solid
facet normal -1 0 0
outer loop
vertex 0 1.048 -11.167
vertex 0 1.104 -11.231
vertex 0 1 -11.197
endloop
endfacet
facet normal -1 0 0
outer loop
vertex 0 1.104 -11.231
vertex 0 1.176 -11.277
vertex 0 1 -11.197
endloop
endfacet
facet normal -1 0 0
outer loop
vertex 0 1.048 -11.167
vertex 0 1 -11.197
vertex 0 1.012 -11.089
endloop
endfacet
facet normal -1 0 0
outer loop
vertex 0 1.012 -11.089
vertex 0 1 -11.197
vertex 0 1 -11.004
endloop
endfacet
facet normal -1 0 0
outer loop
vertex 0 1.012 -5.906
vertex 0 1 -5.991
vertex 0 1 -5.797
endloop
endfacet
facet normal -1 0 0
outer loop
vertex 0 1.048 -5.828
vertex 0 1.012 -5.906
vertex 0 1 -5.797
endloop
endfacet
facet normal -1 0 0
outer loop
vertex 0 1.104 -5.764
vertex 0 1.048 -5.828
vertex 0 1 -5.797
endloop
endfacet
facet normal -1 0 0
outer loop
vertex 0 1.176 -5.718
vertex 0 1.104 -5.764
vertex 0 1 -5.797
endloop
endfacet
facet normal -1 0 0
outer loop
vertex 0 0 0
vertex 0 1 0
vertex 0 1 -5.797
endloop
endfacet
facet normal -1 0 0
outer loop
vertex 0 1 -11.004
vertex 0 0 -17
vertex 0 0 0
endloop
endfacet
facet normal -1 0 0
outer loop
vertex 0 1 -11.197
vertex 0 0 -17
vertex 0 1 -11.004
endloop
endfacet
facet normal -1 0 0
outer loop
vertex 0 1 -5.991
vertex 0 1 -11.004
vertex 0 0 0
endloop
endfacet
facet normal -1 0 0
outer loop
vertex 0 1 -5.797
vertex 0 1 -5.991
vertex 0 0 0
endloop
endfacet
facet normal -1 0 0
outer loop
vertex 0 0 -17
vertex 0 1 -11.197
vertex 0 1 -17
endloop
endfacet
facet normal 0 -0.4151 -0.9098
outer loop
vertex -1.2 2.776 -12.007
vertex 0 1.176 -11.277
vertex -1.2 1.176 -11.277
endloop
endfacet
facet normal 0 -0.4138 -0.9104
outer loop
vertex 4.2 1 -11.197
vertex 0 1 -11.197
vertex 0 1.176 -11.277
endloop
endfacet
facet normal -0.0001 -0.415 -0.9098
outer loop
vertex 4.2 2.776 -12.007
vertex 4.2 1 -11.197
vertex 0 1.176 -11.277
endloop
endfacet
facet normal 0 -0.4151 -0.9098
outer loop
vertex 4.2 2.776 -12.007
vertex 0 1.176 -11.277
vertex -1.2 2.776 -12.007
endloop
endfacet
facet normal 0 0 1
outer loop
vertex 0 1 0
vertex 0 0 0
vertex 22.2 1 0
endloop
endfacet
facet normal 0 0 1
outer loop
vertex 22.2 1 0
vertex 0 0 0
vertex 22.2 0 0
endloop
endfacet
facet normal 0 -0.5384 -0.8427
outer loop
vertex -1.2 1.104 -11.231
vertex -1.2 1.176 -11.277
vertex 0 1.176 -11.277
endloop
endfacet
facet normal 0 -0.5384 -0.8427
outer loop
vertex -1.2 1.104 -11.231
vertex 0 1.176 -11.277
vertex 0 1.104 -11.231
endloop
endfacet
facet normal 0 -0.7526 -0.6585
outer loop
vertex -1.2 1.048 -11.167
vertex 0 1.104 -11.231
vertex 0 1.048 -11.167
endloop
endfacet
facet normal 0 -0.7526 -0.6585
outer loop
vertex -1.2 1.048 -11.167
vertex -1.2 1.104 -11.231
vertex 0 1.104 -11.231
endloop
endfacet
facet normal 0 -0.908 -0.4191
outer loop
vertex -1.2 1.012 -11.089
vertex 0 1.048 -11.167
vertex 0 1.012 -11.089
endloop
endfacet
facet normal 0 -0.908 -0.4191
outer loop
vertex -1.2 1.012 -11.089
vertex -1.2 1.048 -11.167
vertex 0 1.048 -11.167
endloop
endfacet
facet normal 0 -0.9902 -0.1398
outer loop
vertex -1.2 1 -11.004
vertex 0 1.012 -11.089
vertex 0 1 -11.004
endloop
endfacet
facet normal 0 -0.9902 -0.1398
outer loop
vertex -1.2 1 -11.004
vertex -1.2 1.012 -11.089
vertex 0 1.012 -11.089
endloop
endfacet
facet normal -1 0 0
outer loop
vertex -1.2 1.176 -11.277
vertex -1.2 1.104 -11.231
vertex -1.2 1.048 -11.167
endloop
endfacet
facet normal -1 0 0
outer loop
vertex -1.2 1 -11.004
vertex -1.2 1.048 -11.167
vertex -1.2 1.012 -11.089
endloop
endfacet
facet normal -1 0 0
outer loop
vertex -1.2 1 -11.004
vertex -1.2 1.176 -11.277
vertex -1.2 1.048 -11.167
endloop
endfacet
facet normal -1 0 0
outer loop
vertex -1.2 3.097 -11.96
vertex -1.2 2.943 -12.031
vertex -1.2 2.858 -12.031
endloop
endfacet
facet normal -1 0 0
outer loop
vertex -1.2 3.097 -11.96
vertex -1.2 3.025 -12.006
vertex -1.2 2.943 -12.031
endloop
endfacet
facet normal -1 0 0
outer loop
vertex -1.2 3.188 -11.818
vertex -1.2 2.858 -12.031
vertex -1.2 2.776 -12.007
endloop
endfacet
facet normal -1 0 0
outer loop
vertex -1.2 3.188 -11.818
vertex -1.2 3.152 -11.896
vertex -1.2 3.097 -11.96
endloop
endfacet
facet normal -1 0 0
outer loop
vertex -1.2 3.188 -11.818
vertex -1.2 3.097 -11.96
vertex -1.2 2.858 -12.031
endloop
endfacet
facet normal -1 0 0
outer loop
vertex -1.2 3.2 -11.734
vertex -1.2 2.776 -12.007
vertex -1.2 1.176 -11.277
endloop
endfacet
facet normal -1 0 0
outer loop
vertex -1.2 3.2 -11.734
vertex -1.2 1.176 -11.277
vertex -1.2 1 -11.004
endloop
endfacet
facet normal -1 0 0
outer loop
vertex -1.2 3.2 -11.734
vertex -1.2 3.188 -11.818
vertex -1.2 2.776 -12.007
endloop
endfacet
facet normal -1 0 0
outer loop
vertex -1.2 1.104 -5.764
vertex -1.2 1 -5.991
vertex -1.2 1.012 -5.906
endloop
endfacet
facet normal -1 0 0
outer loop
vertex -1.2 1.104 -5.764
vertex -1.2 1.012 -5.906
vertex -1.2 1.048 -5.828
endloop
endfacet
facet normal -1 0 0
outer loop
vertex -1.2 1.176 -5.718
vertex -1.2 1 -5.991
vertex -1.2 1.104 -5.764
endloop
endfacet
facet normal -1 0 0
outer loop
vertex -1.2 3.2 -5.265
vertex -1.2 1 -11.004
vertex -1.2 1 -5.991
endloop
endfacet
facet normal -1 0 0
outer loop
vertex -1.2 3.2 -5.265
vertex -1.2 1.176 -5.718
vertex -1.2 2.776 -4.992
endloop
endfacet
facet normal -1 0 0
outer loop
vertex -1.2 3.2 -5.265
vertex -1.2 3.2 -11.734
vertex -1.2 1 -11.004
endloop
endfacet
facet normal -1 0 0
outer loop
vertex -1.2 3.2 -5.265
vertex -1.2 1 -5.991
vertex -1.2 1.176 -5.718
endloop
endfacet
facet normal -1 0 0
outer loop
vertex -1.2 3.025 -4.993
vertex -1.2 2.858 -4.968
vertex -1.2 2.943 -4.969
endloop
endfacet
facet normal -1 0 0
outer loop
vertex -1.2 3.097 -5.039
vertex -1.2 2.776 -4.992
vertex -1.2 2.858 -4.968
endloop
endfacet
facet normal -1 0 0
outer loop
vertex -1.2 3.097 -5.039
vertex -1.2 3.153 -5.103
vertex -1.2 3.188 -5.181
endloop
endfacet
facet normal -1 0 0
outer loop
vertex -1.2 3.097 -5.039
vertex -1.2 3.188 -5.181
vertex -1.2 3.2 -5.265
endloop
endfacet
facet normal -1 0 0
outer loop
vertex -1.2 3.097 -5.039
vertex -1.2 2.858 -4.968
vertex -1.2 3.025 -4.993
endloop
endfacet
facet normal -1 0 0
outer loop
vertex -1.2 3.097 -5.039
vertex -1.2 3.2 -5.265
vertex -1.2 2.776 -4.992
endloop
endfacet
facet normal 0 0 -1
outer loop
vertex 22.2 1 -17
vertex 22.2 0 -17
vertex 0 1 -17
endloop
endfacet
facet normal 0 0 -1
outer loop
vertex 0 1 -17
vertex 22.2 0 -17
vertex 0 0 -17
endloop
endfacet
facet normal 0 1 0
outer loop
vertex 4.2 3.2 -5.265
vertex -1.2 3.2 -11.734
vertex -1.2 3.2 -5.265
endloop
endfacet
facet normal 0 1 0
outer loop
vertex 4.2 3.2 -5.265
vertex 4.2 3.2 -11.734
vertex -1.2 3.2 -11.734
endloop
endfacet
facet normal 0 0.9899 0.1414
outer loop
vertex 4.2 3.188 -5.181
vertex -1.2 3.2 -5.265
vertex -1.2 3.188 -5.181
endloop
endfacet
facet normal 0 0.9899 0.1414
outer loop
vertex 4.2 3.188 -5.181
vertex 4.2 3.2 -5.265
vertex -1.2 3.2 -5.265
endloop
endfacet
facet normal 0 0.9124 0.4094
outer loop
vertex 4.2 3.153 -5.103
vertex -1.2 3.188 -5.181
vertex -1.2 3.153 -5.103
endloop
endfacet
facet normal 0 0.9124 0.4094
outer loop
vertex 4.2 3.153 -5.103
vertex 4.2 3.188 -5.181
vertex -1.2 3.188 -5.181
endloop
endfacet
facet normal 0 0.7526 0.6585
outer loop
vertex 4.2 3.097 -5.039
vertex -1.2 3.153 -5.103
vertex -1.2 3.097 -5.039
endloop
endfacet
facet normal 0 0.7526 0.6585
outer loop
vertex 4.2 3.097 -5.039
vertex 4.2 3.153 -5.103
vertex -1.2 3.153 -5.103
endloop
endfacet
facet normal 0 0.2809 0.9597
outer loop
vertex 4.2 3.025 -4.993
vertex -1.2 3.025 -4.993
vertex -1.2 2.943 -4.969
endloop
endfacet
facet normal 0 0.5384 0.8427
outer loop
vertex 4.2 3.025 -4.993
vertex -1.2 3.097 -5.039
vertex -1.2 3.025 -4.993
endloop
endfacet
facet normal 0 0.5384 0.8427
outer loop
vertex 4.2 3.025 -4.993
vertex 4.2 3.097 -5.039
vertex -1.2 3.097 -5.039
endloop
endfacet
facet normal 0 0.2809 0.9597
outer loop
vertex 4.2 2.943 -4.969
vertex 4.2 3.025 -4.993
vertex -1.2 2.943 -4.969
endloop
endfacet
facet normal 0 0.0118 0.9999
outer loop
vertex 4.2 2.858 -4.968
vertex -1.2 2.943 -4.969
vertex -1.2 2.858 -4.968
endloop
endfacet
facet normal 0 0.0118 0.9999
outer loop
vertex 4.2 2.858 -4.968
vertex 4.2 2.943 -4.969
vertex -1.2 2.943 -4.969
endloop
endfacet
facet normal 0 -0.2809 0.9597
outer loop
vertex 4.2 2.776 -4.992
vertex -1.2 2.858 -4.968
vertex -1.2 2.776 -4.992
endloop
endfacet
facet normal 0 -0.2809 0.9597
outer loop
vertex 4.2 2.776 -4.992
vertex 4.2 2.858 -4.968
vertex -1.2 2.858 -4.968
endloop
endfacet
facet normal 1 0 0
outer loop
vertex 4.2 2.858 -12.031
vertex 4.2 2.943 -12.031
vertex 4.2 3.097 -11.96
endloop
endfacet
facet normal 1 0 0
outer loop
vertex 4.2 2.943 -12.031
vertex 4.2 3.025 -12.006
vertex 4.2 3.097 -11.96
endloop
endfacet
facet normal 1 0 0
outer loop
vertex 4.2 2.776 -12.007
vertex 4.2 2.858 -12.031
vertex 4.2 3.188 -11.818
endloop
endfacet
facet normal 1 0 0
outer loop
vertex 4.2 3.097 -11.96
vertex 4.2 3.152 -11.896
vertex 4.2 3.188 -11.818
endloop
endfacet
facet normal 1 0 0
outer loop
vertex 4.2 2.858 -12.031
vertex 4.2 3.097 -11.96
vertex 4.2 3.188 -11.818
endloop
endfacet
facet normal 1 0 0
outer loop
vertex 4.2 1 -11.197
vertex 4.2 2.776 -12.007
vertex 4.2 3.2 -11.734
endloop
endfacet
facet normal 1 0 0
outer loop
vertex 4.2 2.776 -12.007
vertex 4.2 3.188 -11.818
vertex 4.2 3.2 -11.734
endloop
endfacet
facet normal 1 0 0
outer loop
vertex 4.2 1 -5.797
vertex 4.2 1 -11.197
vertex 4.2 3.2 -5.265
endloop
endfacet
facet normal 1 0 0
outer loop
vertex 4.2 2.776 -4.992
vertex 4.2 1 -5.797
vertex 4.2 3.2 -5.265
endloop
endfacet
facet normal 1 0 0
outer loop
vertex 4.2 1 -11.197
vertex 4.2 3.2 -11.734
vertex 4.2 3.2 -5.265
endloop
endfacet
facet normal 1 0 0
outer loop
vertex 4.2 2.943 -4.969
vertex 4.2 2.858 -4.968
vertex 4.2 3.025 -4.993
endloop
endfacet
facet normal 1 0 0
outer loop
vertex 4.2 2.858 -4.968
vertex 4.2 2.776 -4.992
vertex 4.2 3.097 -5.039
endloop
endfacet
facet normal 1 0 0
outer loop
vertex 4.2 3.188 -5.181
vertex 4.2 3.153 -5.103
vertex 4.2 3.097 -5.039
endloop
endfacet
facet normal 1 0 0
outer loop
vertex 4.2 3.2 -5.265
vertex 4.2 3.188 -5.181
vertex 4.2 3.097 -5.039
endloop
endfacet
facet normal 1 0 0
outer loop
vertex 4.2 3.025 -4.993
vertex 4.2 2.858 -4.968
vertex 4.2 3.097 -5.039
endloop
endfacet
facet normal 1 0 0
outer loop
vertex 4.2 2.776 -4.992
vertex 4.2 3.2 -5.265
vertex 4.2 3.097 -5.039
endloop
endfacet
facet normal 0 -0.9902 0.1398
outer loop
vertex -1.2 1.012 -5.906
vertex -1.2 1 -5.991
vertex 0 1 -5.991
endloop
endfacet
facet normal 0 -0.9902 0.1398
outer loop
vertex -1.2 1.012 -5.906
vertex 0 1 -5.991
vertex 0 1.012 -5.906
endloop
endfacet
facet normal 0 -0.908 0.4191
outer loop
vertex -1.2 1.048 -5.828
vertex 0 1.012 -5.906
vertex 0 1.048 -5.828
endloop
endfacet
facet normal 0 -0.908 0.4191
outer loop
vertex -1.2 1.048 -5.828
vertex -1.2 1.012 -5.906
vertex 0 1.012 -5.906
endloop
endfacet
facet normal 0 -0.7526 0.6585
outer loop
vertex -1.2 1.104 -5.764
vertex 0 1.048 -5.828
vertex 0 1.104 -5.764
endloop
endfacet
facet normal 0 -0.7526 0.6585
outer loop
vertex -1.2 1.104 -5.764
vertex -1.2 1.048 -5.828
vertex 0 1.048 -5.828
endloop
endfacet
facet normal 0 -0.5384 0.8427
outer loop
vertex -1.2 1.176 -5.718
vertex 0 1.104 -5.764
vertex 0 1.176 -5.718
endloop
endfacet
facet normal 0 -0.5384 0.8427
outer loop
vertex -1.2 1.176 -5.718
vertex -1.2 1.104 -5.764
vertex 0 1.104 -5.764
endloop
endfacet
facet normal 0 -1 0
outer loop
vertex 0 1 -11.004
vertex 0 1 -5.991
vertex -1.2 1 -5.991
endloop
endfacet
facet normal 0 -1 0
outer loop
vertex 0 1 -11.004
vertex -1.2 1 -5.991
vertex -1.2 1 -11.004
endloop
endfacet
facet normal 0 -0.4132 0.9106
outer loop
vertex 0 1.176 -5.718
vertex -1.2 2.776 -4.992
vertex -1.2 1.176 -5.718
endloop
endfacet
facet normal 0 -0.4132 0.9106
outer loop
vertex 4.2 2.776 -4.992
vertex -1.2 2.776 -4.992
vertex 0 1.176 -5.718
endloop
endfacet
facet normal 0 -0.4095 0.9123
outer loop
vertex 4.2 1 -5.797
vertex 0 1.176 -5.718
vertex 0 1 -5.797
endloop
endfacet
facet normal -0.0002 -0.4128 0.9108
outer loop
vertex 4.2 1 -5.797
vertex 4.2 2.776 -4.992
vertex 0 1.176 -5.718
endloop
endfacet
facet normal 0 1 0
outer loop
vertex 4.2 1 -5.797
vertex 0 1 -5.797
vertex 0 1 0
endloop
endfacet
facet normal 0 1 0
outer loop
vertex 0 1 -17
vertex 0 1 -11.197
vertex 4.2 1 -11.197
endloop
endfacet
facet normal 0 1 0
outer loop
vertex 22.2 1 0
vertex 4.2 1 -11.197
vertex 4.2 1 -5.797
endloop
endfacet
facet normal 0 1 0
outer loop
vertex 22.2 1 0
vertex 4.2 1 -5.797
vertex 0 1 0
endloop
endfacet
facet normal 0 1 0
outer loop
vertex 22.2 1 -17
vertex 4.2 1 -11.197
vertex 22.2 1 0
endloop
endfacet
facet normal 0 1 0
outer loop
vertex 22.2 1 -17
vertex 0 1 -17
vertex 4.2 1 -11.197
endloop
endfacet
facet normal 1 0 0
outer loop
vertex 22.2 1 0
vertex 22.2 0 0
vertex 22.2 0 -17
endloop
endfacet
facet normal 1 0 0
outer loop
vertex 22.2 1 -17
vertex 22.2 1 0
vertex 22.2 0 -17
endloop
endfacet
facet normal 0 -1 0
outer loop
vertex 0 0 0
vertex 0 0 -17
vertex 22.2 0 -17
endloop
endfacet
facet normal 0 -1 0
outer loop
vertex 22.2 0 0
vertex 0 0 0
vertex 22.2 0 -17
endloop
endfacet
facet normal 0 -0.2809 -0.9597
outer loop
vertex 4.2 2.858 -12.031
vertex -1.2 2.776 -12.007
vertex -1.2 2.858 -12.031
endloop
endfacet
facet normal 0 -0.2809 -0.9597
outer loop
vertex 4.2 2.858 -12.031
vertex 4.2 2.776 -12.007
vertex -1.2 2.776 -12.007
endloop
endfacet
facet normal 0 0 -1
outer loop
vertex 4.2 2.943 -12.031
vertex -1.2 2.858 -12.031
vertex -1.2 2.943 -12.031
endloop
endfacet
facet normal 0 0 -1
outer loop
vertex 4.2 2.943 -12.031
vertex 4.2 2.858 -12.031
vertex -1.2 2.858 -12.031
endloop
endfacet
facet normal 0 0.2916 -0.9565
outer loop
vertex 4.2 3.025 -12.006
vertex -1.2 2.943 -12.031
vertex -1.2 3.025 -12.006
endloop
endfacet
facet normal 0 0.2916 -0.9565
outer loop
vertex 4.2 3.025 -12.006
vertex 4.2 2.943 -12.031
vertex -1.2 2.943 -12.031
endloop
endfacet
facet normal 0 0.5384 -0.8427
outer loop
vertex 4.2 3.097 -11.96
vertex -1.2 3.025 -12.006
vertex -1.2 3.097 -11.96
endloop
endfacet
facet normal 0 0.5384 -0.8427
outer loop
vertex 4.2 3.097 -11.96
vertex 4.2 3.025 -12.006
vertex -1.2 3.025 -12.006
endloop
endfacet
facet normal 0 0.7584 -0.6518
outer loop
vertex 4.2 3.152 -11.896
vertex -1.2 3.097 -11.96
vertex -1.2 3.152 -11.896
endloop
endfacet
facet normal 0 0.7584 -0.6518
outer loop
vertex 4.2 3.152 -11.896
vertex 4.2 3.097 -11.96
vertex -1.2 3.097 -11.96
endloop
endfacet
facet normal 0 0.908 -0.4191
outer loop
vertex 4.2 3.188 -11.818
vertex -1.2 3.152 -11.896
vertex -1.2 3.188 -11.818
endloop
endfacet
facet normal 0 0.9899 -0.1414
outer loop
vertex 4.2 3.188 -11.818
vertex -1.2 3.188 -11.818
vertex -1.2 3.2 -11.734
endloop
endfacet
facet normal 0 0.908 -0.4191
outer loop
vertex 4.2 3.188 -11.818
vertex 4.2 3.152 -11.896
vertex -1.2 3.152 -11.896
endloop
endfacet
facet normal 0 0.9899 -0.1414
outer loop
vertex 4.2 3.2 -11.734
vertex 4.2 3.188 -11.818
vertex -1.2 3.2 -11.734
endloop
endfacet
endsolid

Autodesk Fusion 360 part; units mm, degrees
sketch "Sketch1" plane through (0, 0, 0) normal (0, 1, 0) x (1, 0, 0)
  line L0 (0, 0) -> (22.2, 0)
  line L1 (22.2, 0) -> (22.2, 17)
  line L2 (22.2, 17) -> (0, 17)
  line L3 (0, 17) -> (0, 0)
  dimension "d1" = 22.2
  dimension "d2" = 17
extrude "Extrude1" add sketch "Sketch1" along normal blind 1
sketch "Sketch2" plane through (0, 0, 0) normal (-1, 0, 0) x (0, 0, 1)
  line L0 (-17, 0) -> (0, 0)
  line L1 (0, 0) -> (0, 1)
  line L2 (0, 1) -> (-17, 1)
  line L3 (-17, 1) -> (-17, 0)
  line L4 (-12.2, 3.2) -> (-4.8, 3.2)
  line L5 (-4.8, 3.2) -> (-5.7974, 1)
  line L6 (-11.1974, 1) -> (-12.2, 3.2)
  point P0 (-8.5, 1)
  point P1 (-8.5, 3.2)
  dimension "d5" = 7.4
  dimension "d6" = 5.4
  dimension "d7" = 2.2
  dimension "d8" = 114.5
extrude "Extrude2" add sketch "Sketch2" along normal blind 1.2 and the other way blind 4.2 contours L2 L4 L5 L6
fillet "Fillet1" radius 0.3 4 edges at (1.5, 3.2, -4.8) (1.5, 3.2, -12.2) (-0.6, 1, -5.7974) (-0.6, 1, -11.1974)
